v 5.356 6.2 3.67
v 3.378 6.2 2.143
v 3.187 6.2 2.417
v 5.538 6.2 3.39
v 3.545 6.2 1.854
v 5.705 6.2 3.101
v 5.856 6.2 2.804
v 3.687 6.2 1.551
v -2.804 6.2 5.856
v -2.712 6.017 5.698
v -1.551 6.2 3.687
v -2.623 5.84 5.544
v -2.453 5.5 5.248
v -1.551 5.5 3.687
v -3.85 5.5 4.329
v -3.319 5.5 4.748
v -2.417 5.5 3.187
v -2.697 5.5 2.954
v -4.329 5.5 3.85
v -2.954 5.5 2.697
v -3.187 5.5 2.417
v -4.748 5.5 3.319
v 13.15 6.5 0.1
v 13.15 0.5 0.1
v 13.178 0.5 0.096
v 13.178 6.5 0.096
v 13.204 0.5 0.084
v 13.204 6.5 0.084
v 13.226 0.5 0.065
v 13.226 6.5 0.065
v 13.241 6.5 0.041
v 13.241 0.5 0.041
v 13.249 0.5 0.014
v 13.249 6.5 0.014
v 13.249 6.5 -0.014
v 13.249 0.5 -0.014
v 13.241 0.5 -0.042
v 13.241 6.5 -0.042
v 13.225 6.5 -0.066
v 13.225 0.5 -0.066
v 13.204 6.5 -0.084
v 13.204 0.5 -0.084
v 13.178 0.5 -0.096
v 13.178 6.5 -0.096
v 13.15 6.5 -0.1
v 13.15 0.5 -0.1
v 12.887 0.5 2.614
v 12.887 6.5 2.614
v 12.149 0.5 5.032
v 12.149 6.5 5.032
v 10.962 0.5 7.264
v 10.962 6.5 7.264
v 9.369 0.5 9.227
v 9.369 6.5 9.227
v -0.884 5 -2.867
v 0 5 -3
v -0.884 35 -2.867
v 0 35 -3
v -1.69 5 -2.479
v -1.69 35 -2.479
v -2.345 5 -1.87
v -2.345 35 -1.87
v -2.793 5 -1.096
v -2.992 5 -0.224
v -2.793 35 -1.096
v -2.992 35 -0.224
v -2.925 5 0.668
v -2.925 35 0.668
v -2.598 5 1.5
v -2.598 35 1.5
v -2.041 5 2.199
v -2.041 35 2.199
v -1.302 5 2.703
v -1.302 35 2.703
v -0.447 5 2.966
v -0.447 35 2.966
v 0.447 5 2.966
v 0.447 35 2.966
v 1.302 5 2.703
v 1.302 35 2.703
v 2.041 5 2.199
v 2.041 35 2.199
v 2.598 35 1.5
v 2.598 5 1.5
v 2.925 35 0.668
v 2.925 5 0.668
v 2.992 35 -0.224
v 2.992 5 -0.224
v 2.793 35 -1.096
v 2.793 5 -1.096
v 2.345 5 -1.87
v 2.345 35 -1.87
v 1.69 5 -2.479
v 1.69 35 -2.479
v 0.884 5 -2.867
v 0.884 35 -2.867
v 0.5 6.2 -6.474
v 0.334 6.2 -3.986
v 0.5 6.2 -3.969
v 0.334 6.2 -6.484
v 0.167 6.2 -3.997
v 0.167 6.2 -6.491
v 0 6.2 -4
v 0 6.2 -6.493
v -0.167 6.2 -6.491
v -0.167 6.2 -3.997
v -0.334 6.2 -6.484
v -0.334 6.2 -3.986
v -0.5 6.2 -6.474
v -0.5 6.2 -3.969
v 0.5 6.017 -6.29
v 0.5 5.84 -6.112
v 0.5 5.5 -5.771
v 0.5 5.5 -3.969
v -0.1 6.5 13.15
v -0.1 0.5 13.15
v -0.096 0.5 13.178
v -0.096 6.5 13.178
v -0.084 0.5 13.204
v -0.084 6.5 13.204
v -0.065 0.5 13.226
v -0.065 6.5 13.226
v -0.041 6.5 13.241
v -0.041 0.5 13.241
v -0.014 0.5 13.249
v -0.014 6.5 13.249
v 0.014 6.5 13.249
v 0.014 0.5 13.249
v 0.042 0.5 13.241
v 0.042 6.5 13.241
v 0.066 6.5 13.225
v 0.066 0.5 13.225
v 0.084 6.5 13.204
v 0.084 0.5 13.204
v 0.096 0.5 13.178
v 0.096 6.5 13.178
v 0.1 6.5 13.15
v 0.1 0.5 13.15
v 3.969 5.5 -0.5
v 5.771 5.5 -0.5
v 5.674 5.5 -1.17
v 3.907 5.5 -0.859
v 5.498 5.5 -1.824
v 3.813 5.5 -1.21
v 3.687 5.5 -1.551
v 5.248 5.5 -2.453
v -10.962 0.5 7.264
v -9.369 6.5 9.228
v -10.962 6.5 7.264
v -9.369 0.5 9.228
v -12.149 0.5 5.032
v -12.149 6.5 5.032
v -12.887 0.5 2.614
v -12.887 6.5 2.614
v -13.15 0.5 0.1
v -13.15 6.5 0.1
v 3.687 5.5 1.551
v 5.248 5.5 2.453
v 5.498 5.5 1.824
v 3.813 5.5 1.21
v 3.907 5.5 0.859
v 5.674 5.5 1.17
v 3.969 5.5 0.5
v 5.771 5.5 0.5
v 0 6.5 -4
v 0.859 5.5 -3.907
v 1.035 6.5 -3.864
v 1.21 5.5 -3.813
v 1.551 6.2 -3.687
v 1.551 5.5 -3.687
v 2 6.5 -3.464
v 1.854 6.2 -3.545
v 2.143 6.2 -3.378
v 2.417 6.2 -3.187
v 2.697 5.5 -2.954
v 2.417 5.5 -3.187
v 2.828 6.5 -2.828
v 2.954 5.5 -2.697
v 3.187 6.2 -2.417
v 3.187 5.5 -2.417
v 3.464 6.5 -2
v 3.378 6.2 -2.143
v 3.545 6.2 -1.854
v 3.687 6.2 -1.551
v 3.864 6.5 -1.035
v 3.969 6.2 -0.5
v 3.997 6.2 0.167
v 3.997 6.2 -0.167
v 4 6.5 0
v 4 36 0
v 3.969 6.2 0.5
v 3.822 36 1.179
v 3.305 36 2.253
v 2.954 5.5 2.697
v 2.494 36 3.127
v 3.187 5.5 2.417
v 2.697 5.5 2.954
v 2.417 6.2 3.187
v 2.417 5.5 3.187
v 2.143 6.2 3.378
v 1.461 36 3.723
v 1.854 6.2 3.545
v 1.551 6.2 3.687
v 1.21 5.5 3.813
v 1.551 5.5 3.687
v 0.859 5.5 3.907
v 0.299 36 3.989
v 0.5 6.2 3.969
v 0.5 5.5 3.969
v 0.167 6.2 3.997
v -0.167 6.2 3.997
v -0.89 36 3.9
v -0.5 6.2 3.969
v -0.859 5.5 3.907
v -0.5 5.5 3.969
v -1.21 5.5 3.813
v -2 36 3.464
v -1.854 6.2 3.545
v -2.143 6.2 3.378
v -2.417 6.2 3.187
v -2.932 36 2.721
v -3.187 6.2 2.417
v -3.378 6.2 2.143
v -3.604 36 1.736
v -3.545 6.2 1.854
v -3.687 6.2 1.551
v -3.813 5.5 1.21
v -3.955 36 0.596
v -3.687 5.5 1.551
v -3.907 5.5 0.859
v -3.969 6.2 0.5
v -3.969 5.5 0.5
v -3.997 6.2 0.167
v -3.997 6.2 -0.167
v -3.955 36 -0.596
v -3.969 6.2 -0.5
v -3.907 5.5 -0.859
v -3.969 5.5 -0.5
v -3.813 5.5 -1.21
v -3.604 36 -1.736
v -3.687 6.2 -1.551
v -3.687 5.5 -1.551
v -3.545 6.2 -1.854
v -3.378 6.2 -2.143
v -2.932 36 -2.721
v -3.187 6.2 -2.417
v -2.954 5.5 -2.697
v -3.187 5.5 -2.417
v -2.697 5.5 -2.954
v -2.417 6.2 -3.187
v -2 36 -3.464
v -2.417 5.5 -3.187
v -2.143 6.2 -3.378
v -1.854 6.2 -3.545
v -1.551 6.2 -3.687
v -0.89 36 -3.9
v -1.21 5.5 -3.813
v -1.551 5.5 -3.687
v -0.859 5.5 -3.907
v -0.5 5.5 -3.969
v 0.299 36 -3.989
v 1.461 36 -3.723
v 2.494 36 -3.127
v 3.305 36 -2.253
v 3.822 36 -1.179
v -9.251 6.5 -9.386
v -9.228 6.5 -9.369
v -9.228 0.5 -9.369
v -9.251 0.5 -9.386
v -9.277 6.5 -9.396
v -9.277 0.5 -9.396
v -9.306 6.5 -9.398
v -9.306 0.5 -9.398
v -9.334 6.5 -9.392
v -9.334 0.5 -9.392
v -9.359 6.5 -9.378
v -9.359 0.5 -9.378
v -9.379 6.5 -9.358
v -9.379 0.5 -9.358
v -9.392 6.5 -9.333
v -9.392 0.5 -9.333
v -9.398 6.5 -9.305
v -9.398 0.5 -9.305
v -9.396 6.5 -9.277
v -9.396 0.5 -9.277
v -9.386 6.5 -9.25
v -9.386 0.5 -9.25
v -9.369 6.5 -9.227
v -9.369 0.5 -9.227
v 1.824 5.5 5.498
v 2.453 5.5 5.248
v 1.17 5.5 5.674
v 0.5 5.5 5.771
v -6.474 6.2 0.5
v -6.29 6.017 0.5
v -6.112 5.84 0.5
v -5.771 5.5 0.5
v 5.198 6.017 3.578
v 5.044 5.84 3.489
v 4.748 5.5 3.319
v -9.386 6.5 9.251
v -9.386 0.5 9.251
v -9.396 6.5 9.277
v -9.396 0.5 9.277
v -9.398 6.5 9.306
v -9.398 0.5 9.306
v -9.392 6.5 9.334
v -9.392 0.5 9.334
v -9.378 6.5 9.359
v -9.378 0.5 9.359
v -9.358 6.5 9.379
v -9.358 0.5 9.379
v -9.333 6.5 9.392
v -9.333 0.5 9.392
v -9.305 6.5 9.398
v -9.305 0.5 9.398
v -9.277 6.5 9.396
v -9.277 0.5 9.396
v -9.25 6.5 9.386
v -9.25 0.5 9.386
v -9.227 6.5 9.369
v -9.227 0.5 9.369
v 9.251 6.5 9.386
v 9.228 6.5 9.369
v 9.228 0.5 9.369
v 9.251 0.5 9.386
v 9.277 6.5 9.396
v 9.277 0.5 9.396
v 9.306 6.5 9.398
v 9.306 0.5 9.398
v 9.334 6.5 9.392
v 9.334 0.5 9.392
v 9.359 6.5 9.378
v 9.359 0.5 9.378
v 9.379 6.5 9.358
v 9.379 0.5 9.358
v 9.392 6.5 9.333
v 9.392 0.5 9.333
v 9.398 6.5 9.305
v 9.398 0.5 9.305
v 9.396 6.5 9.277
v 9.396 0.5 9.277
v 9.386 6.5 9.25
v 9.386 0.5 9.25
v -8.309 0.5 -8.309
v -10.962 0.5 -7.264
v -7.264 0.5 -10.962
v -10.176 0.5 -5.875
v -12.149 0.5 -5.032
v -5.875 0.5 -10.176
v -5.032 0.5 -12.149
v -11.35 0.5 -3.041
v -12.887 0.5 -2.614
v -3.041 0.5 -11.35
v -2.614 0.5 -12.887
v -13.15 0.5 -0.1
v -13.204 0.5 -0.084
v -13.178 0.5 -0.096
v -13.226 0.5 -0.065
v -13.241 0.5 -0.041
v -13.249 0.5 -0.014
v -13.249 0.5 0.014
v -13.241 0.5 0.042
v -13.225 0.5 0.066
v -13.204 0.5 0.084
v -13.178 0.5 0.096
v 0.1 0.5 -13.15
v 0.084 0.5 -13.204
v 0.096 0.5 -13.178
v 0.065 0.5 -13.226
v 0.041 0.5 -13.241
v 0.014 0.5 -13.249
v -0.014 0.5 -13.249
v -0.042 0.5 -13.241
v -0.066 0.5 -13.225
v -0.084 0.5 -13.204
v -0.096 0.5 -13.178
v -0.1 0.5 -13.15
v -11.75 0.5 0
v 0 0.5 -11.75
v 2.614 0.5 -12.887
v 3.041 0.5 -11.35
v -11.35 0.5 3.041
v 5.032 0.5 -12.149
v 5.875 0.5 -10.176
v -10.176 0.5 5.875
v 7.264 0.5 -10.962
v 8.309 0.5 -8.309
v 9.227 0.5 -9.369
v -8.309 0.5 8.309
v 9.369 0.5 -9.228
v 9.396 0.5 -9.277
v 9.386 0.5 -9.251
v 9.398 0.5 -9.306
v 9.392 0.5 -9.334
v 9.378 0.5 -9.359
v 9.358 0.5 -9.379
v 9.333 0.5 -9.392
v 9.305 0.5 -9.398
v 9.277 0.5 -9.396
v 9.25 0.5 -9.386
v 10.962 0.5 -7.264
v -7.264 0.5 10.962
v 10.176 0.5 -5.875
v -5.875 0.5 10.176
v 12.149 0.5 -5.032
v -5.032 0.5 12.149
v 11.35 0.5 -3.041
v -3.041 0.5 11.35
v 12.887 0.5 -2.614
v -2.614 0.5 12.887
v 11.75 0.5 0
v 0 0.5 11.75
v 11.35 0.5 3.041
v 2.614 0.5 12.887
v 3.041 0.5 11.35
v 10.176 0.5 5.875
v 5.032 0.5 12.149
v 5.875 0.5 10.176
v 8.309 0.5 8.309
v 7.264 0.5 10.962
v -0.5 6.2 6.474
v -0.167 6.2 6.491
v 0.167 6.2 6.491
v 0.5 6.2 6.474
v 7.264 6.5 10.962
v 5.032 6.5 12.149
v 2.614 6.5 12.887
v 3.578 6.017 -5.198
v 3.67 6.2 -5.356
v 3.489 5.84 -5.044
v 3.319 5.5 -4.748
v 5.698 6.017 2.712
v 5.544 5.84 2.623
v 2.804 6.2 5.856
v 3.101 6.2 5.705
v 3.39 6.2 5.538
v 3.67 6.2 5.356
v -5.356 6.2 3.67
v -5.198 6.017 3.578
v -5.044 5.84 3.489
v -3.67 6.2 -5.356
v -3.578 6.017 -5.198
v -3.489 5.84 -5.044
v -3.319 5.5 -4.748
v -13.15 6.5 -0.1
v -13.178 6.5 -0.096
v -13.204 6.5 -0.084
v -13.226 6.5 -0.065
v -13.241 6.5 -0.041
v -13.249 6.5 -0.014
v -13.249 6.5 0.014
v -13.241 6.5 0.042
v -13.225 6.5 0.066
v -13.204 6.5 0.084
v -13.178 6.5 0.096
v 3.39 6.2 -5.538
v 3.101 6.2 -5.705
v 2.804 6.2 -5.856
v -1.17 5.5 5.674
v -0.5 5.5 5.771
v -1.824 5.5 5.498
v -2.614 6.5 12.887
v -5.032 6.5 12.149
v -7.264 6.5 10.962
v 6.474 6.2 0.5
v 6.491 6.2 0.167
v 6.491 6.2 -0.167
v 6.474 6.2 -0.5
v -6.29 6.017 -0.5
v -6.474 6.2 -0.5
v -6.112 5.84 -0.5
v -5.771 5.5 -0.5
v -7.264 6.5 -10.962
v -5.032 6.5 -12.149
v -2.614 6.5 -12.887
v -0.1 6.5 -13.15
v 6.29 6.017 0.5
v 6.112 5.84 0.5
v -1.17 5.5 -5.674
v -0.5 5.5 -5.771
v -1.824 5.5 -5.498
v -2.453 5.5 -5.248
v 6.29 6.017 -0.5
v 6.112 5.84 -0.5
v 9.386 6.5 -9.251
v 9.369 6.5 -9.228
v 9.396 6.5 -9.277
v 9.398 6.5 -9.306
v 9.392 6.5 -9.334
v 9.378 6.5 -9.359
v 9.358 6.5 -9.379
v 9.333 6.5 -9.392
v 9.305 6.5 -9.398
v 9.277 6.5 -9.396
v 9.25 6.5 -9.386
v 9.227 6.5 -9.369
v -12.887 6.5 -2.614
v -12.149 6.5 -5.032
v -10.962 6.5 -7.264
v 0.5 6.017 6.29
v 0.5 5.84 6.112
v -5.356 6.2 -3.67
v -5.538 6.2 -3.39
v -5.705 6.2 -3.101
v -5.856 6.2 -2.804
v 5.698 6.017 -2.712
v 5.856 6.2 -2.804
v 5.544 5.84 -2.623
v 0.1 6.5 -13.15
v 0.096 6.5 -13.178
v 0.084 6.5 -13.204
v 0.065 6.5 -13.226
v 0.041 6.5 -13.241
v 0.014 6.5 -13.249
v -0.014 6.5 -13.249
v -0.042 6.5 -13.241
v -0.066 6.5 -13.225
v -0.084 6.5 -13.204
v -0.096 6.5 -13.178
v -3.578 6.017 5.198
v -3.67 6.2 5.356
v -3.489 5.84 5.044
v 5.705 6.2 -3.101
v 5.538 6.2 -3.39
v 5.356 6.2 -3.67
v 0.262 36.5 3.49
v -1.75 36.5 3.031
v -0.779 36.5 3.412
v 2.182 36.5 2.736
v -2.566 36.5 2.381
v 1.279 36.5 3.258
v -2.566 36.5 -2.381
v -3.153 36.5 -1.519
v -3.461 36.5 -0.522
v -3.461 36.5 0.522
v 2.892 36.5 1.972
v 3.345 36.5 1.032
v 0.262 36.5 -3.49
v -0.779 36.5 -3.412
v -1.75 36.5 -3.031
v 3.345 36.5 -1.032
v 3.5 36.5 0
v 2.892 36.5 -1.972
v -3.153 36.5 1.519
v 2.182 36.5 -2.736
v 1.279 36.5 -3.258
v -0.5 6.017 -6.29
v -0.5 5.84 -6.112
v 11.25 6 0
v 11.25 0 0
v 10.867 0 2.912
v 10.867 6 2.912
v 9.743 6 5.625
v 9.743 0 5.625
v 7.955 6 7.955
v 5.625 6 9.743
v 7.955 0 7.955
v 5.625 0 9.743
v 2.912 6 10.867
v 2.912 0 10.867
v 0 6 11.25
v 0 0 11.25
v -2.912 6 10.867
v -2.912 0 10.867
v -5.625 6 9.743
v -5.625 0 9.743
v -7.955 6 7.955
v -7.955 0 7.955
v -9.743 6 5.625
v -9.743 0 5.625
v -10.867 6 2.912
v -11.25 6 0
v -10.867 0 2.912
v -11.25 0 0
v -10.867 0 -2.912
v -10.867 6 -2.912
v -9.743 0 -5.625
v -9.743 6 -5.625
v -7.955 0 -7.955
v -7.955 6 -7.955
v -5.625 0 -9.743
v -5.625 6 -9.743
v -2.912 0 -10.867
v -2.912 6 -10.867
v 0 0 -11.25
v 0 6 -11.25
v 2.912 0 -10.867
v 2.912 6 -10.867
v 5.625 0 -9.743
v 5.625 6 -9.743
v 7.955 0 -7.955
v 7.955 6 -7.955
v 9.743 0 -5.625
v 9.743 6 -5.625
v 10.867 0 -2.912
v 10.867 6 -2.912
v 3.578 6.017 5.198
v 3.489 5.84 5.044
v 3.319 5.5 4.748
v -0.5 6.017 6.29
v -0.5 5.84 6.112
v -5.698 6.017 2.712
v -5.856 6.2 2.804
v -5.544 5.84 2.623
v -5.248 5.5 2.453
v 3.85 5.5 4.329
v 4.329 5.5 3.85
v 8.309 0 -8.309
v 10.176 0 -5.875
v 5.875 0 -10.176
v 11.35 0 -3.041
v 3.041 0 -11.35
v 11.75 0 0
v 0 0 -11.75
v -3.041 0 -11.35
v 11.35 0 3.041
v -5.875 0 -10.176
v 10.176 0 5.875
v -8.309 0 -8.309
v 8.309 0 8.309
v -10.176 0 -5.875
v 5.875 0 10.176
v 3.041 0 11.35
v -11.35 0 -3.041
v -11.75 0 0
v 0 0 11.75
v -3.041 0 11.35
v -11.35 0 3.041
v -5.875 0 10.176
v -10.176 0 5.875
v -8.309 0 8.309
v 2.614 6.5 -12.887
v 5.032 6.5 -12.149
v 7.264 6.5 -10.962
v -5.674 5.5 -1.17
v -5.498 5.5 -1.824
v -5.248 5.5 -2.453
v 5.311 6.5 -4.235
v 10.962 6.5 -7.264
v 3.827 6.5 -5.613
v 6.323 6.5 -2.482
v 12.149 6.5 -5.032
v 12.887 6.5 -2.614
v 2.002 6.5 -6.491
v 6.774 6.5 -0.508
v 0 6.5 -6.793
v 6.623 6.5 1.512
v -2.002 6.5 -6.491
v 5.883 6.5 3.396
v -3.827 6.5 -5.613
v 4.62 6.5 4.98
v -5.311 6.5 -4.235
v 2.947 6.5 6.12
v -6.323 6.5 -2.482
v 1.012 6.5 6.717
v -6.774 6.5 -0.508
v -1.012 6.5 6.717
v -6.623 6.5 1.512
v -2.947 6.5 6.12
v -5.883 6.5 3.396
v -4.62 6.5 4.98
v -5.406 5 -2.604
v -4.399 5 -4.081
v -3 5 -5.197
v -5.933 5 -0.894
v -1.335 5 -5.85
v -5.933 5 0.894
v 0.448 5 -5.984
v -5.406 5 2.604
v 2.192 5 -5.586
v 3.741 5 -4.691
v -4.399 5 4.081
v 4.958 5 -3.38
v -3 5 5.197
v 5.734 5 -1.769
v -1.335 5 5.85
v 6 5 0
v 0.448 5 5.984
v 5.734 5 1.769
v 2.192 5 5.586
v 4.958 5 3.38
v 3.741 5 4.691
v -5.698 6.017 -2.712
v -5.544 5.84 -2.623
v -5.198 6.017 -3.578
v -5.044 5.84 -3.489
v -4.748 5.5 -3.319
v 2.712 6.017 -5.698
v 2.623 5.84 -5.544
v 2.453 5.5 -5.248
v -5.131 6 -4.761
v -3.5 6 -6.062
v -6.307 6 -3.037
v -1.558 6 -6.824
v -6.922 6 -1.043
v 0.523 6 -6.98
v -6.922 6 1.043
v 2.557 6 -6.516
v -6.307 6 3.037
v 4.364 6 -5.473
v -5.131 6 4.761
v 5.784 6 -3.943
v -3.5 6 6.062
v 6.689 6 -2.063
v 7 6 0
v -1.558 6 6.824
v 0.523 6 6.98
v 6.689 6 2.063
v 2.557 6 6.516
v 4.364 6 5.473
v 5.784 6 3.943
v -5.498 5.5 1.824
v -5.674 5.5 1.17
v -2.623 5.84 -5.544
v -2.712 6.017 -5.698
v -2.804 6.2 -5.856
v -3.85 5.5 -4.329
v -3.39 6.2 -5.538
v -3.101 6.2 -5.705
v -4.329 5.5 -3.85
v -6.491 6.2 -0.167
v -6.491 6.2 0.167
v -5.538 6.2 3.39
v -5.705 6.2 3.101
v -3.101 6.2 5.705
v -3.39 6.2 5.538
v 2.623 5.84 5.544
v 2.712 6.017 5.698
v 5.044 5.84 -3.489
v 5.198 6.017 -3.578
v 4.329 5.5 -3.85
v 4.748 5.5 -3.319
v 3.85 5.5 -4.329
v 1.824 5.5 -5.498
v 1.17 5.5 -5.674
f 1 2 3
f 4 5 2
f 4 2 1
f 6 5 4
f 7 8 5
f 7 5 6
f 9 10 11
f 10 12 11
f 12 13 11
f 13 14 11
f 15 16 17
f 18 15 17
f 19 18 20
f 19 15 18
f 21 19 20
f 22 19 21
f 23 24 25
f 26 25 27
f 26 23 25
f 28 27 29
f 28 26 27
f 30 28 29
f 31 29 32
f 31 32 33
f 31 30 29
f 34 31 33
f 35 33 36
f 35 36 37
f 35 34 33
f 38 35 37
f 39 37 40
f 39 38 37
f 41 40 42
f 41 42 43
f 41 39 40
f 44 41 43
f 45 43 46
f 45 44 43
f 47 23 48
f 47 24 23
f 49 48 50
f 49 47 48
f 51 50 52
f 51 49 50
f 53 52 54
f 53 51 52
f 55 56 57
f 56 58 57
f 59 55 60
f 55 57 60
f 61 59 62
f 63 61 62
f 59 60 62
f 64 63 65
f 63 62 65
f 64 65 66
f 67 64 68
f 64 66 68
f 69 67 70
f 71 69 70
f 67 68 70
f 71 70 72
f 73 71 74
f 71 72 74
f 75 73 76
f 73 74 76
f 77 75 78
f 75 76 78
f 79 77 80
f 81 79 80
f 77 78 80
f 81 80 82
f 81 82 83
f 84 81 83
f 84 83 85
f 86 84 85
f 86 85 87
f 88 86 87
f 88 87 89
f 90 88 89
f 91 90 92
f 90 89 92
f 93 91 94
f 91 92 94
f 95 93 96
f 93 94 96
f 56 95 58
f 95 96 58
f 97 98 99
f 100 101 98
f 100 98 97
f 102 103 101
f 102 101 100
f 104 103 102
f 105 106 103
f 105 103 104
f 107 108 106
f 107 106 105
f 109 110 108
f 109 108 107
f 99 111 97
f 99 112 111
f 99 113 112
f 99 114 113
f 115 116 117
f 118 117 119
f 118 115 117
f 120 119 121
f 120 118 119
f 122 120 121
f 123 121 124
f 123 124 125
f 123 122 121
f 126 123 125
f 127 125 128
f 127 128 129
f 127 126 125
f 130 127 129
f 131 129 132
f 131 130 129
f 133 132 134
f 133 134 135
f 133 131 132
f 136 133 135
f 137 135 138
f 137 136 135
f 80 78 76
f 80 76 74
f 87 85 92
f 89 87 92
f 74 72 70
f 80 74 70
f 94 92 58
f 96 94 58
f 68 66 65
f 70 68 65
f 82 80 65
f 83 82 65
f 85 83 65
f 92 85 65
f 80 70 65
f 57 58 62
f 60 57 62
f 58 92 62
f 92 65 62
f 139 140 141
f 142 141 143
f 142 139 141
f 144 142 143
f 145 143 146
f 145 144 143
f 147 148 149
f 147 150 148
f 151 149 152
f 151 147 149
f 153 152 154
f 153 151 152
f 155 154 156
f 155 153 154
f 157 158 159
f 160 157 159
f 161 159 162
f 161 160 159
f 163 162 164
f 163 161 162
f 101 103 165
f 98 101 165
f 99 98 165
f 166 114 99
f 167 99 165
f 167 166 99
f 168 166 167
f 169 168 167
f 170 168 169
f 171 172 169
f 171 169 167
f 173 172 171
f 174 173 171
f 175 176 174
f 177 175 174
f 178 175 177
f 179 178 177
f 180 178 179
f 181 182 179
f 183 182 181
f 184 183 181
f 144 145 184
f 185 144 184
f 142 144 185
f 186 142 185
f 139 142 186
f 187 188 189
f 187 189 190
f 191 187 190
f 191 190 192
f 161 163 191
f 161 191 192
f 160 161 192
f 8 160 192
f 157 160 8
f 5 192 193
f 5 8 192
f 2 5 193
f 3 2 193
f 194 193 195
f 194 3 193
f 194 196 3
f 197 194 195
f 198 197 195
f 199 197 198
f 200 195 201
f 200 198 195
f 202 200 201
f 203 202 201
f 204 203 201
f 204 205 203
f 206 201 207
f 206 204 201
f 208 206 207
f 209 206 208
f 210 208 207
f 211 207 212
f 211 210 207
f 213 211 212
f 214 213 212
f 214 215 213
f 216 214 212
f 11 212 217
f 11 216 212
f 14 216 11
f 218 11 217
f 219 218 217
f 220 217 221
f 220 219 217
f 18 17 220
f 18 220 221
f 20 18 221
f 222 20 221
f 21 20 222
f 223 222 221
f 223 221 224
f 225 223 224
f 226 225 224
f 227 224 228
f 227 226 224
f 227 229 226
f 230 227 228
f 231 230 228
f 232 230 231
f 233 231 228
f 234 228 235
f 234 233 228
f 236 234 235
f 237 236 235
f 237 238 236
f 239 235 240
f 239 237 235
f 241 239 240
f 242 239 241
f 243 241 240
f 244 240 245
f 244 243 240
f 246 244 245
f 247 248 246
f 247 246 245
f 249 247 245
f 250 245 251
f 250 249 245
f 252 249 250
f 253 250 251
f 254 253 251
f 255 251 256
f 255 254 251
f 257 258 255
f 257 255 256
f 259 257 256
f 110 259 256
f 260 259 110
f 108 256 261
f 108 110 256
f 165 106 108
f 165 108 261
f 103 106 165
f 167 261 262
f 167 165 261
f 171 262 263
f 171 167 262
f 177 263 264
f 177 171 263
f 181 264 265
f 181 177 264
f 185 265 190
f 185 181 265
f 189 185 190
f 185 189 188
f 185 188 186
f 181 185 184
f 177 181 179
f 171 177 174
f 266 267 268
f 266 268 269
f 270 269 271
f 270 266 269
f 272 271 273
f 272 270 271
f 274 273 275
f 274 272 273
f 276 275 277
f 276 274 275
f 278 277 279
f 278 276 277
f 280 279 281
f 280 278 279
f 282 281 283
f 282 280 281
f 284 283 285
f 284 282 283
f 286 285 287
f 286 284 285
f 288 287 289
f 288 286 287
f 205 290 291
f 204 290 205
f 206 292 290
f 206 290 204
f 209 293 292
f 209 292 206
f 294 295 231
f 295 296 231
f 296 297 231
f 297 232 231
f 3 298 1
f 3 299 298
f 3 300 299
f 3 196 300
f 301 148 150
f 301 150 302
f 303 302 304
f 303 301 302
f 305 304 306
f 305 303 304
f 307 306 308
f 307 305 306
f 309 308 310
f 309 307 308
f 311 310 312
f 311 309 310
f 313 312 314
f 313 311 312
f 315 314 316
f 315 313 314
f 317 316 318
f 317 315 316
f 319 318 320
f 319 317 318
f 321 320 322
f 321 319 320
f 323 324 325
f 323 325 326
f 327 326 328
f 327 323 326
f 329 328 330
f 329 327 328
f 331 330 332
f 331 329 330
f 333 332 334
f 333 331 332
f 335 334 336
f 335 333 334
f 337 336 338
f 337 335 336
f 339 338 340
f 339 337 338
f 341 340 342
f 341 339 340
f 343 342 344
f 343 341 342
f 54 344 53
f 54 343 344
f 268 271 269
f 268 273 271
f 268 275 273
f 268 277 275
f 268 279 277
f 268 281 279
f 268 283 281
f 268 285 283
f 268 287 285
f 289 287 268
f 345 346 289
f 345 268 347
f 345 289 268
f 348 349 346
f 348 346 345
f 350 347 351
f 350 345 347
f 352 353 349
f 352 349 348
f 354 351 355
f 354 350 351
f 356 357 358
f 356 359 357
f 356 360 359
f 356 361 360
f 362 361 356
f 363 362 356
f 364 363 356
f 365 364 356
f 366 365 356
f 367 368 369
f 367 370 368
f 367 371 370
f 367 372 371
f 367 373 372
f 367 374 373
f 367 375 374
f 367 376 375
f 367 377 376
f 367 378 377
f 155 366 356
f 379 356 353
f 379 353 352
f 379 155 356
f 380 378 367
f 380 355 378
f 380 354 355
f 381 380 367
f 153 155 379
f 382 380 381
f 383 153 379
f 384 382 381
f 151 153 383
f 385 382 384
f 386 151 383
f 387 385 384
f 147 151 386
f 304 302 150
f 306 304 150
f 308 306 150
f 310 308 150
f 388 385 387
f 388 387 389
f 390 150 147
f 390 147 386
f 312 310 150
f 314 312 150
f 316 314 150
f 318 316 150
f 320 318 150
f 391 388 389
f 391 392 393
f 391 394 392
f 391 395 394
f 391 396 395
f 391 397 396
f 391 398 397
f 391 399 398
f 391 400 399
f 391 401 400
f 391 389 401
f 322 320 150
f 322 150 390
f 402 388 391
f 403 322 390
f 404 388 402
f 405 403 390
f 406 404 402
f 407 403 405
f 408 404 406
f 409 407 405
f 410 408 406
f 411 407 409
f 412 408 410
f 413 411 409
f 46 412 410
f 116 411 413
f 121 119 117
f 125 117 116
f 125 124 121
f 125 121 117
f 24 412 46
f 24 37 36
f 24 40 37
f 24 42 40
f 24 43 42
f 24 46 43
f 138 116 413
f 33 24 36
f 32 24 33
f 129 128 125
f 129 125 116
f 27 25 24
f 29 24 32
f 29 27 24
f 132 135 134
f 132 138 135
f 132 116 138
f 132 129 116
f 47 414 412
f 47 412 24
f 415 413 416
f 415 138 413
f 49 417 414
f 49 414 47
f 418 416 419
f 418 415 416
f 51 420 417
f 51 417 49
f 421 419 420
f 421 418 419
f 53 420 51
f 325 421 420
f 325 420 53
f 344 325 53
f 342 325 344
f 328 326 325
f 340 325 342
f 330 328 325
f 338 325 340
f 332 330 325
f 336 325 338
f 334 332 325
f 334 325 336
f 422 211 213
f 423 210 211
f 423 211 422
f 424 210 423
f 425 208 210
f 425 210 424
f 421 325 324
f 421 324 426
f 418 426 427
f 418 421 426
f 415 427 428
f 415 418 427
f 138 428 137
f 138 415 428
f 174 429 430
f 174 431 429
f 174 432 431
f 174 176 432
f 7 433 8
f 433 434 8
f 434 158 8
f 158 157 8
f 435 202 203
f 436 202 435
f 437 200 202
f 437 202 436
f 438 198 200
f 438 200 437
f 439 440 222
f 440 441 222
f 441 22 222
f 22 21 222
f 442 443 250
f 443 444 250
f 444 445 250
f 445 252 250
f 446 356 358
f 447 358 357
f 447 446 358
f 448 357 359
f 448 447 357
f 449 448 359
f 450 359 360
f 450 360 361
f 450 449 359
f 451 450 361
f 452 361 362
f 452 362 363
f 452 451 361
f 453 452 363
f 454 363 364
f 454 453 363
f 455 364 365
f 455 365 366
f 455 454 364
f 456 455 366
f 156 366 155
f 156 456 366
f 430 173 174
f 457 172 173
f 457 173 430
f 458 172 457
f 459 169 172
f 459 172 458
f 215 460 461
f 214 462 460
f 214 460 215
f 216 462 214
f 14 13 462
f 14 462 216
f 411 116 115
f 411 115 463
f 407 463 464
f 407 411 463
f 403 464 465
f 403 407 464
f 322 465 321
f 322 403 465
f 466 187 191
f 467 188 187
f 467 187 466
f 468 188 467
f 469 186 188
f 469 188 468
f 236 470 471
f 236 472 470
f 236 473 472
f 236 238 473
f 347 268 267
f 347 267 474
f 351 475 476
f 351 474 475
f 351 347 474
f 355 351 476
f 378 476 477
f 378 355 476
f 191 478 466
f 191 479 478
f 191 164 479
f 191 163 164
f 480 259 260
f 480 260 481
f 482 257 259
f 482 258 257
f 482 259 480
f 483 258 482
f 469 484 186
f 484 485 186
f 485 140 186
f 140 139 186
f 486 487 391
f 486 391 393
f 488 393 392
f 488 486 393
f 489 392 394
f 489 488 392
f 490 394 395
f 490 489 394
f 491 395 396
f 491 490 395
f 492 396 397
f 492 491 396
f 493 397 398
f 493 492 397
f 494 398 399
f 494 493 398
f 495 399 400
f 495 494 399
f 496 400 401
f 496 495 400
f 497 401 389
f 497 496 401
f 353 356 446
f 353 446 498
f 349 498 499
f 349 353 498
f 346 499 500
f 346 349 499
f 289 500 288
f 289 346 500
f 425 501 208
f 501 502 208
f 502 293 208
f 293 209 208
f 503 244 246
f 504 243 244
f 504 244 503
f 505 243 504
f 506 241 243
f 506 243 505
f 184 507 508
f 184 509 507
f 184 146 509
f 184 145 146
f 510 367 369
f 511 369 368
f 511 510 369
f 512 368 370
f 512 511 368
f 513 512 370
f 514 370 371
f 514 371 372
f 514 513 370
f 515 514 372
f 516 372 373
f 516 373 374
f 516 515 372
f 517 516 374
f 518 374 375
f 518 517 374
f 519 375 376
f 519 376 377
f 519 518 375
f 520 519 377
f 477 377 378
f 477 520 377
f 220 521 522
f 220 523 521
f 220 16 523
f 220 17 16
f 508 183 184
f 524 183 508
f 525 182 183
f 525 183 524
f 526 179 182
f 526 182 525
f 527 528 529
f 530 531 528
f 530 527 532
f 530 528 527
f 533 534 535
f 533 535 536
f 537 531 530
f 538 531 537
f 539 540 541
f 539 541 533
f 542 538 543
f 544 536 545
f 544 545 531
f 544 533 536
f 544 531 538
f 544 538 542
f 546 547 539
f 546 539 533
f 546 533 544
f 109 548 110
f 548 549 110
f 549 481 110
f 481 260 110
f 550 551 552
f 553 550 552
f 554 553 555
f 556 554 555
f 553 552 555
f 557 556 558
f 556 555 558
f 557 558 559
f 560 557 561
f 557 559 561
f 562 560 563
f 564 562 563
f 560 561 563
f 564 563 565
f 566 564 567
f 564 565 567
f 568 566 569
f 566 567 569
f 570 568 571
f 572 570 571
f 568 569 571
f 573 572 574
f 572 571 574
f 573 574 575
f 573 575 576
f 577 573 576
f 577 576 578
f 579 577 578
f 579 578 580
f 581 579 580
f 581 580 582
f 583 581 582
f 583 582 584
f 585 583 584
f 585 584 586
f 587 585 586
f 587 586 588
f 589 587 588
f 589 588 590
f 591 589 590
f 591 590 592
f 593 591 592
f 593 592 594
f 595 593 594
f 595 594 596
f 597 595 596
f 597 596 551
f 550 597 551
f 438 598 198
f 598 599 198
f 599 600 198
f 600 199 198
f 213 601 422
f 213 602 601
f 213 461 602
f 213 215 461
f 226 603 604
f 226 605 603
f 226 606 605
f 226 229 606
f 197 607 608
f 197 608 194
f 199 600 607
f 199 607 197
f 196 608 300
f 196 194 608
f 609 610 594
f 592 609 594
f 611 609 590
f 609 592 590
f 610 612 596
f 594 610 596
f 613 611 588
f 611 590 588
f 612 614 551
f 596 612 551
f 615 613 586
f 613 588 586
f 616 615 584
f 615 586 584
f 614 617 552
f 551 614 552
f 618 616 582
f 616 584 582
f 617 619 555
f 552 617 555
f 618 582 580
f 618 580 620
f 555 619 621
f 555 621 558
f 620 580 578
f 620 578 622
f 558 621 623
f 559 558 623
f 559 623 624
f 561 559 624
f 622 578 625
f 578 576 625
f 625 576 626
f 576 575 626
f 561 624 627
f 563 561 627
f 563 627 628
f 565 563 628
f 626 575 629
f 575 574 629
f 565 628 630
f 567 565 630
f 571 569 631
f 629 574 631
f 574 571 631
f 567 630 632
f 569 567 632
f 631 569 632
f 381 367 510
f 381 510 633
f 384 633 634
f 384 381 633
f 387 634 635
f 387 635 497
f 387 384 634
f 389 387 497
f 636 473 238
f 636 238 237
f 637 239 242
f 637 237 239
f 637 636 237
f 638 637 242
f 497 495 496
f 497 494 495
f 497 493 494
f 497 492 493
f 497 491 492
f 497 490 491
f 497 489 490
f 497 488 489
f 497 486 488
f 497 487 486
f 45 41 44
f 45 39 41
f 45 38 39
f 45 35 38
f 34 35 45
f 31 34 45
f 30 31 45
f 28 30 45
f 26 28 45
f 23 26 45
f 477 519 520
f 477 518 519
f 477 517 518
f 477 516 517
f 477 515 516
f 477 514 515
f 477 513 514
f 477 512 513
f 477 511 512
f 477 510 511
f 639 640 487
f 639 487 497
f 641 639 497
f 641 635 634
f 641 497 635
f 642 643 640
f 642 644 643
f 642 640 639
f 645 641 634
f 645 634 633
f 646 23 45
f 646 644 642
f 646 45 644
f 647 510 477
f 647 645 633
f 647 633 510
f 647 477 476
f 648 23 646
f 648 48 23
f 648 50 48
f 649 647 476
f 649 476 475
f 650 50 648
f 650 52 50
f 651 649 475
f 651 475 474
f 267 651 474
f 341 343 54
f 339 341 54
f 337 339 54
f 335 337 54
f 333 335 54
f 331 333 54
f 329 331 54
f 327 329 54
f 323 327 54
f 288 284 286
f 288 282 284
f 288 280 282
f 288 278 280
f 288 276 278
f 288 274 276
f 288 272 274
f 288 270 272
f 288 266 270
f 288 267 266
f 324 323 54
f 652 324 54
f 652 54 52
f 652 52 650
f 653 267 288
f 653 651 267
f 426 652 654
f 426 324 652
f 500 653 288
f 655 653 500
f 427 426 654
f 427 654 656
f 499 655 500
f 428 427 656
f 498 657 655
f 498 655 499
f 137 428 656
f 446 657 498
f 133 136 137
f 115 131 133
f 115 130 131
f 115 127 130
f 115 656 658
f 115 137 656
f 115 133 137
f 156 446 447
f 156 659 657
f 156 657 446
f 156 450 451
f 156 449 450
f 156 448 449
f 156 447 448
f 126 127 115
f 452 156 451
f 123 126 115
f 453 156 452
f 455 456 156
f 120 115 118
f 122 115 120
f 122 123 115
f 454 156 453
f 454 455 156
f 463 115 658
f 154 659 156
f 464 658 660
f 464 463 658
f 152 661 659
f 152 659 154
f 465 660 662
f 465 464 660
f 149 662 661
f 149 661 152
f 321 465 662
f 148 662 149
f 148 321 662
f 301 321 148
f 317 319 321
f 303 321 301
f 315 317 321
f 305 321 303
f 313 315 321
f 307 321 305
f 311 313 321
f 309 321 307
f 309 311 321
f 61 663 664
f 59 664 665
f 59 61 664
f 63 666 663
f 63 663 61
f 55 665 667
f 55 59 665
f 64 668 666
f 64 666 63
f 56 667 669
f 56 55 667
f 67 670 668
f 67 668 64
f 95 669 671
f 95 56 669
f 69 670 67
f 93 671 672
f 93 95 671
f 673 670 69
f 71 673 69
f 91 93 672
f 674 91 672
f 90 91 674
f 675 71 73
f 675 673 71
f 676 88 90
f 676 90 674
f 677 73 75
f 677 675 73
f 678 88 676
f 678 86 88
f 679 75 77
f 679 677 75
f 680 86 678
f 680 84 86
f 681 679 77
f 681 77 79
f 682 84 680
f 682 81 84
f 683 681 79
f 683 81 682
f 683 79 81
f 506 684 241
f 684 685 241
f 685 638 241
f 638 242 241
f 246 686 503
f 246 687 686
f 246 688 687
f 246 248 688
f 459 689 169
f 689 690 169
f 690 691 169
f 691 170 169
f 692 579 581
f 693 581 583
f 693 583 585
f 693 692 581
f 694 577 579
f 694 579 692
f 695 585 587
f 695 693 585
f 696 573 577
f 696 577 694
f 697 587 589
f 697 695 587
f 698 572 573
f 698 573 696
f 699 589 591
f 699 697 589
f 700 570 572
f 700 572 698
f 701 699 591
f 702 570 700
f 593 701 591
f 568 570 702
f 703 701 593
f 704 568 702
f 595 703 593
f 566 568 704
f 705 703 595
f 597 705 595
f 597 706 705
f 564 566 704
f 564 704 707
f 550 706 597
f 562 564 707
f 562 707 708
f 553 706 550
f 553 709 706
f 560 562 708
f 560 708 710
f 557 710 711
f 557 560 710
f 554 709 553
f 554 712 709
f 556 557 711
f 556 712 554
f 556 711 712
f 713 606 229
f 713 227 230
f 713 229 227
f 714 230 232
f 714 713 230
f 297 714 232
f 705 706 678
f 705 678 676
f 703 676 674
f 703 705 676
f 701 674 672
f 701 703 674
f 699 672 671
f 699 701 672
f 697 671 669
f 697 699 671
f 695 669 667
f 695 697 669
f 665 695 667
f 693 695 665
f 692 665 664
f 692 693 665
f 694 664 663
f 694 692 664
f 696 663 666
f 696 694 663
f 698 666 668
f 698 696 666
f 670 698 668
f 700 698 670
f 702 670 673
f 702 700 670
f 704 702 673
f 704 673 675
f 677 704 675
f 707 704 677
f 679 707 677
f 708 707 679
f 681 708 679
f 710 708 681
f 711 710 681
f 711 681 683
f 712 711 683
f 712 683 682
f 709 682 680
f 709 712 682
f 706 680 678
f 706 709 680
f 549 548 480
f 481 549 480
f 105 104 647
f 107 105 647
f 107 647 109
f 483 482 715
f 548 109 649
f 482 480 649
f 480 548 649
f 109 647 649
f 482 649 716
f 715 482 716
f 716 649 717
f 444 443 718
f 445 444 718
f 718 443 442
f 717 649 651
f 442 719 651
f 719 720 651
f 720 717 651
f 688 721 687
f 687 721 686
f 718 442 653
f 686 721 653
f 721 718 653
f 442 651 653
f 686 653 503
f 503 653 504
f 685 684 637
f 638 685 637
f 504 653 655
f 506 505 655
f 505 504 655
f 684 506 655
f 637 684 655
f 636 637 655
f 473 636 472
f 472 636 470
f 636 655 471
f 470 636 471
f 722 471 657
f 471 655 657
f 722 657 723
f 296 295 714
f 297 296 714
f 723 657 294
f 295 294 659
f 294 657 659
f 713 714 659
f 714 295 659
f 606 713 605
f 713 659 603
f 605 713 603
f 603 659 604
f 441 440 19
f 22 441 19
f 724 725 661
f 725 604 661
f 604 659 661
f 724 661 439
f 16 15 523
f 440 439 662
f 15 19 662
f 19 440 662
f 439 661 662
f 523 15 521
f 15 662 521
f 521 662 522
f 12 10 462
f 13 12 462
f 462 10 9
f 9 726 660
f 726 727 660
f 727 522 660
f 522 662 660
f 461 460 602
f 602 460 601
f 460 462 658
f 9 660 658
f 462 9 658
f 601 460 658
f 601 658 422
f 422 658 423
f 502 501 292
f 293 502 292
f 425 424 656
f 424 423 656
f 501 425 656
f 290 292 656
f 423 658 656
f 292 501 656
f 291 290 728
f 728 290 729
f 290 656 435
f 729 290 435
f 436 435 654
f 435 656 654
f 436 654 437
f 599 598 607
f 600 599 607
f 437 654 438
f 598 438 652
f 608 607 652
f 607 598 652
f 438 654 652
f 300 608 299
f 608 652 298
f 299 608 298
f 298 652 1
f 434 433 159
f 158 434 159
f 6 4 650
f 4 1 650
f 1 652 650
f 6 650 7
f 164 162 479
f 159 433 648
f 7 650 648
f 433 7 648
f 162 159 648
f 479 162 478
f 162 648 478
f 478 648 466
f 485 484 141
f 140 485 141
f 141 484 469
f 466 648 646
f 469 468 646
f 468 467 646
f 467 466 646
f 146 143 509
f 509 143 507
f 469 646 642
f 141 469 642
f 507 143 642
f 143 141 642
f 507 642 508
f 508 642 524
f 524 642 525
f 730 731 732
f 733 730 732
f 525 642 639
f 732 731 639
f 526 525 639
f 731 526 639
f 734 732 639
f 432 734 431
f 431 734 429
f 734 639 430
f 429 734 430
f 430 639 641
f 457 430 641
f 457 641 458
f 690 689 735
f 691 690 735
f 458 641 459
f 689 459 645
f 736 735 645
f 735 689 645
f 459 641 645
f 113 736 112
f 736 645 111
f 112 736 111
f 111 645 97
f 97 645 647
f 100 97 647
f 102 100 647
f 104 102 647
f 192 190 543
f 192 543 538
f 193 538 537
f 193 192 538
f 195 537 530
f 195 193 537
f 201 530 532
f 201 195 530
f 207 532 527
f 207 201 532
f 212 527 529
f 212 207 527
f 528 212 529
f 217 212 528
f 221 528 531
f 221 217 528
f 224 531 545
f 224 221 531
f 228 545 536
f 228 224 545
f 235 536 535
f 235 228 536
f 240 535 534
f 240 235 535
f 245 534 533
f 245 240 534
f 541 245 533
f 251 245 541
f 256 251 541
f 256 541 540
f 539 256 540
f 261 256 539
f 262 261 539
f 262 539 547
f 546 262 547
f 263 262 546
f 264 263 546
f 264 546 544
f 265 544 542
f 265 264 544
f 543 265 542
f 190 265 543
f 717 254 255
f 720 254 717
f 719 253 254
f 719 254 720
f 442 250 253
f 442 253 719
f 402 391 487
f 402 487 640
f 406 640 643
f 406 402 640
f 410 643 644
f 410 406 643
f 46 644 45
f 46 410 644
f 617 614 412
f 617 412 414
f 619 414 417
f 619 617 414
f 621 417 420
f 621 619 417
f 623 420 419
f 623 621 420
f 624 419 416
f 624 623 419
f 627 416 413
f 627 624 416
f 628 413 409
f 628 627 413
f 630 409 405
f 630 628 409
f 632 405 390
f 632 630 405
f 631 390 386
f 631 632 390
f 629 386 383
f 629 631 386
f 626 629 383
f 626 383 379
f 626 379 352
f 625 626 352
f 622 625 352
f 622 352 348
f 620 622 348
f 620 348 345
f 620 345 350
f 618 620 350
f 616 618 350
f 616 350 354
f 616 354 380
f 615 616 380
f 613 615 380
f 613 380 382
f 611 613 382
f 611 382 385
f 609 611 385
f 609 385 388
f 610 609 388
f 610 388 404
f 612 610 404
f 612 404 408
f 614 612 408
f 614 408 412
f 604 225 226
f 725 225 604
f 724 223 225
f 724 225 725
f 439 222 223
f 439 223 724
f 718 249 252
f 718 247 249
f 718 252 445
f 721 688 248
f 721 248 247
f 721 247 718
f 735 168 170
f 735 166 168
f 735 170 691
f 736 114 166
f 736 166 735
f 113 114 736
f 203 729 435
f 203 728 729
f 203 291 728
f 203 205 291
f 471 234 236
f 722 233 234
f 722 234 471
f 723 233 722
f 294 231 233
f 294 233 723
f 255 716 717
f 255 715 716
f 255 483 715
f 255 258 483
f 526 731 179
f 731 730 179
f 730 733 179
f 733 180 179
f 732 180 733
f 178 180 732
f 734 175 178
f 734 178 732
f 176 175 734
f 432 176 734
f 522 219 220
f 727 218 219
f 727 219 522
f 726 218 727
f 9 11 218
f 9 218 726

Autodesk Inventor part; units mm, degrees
ref_plane "YZ Plane" through (0, 0, 0) normal (1, 0, 0) x (0, 1, 0)
ref_plane "XZ Plane" through (0, 0, 0) normal (0, 1, 0) x (-1, 0, 0)
ref_plane "XY Plane" through (0, 0, 0) normal (0, 0, 1) x (1, 0, 0)
sketch "Sketch1" plane through (0, 0, 0) normal (0, 1, 0) x (-1, 0, 0)
  circle A0 centre (0, 0) radius 13.15
  dimension "d0" = 26.3
extrude "Extrusion1" add sketch "Sketch1" along normal blind 6.5
sketch "Sketch2" plane through (0, 0, 0) normal (0, -1, 0) x (1, 0, 0)
  circle A0 centre (0, 0) radius 13.15 projected
  circle A1 centre (0, 0) radius 11.75
  dimension "d3" = 23.5
extrude "Extrusion2" cut sketch "Sketch2" against normal blind 0.5
sketch "Sketch3" plane through (0, 0, 0) normal (0, -1, 0) x (1, 0, 0)
  circle A0 centre (0, 0) radius 11.25
  dimension "d6" = 22.5
extrude "Extrusion3" cut sketch "Sketch3" against normal blind 6
sketch "Sketch4" plane through (0, 6.5, 0) normal (0, 1, 0) x (1, 0, 0)
  circle A0 centre (0, 0) radius 4
  dimension "d9" = 8
extrude "Extrusion4" add sketch "Sketch4" along normal blind 30
chamfer "Chamfer1" distance 0.5 angle 45 1 edges at (-4, 36.5, 0)
sketch "Sketch5" plane through (0, 6, 0) normal (0, -1, 0) x (1, 0, 0)
  circle A0 centre (0, 0) radius 7
  dimension "d15" = 14
extrude "Extrusion5" add sketch "Sketch5" along normal blind 1
chamfer "Chamfer2" distance 1 angle 45 1 edges at (-7, 5, 0)
sketch "Sketch6" plane through (0, 5, 0) normal (0, -1, 0) x (1, 0, 0)
  point P0 (0, 0)
hole "Hole1" at (0, 5, 0) direction (0, 1, 0) diameter 6 depth 30
sketch "Sketch7" plane through (0, 0, 0) normal (1, 0, 0) x (0, 1, 0)
  line L0 (6.5, 4) -> (6.5, -4) projected
  line L1 (6.5, -4) -> (5.5, -4)
  line L2 (5.5, -4) -> (5.5, -5.7929)
  line L3 (5.5, -5.7929) -> (6.5, -6.7929)
  line L4 (6.5, -13.15) -> (6.5, 13.15) projected
  line L5 (0.5, -11.75) -> (0, -11.75) projected
  line L6 (0, -11.75) -> (0, -11.25) projected
  line L7 (0, -11.25) -> (6, -11.25) projected
  line L8 (6, -11.25) -> (6, -7) projected
  line L9 (6, -7) -> (5, -6) projected
  line L10 (5, -6) -> (5, -3) projected
  line L11 (5, -3) -> (35, -3) projected
  line L12 (35, -3) -> (35, 3) projected
  line L13 (35, 3) -> (5, 3) projected
  line L14 (5, 3) -> (5, 6) projected
  line L15 (5, 6) -> (6, 7) projected
  line L16 (6, 7) -> (6, 11.25) projected
  line L17 (6, 11.25) -> (0, 11.25) projected
  line L18 (0, 11.25) -> (0, 11.75) projected
  line L19 (0, 11.75) -> (0.5, 11.75) projected
  line L20 (0.5, 11.75) -> (0.5, 13.15) projected
  line L21 (0.5, 13.15) -> (6.5, 13.15) projected
  line L22 (6.5, 13.15) -> (6.5, 4) projected
  line L23 (6.5, 4) -> (36, 4) projected
  line L24 (36, 4) -> (36.5, 3.5) projected
  line L25 (36.5, 3.5) -> (36.5, -3.5) projected
  line L26 (36.5, -3.5) -> (36, -4) projected
  line L27 (36, -4) -> (6.5, -4) projected
  line L28 (6.5, -4) -> (6.5, -13.15) projected
  line L29 (6.5, -13.15) -> (0.5, -13.15) projected
  line L30 (0.5, -13.15) -> (0.5, -11.75) projected
  line L31 (0, 0) -> (40, 0)
  dimension "d28" = 0.5
  dimension "d29" = 0.5
  dimension "d30" = 0.5
revolve "Revolution1" cut sketch "Sketch7" angle 360 about axis through (0, 0, 0) along (0, 1, 0) contours L4 L3 L2 L1
sketch "Sketch8" plane through (0, 0, 0) normal (1, 0, 0) x (0, 1, 0)
  line L0 (0.5, -11.75) -> (0, -11.75) projected
  line L1 (0, -11.75) -> (0, -11.25) projected
  line L2 (0, -11.25) -> (6, -11.25) projected
  line L3 (6, -11.25) -> (6, -7) projected
  line L4 (6, -7) -> (5, -6) projected
  line L5 (5, -6) -> (5, -3) projected
  line L6 (5, -3) -> (35, -3) projected
  line L7 (35, -3) -> (35, 3) projected
  line L8 (35, 3) -> (5, 3) projected
  line L9 (5, 3) -> (5, 6) projected
  line L10 (5, 6) -> (6, 7) projected
  line L11 (6, 7) -> (6, 11.25) projected
  line L12 (6, 11.25) -> (0, 11.25) projected
  line L13 (0, 11.25) -> (0, 11.75) projected
  line L14 (0, 11.75) -> (0.5, 11.75) projected
  line L15 (0.5, 11.75) -> (0.5, 13.15) projected
  line L16 (0.5, 13.15) -> (6.5, 13.15) projected
  line L17 (6.5, 13.15) -> (6.5, 6.7929) projected
  line L18 (6.5, 6.7929) -> (5.5, 5.7929) projected
  line L19 (5.5, 5.7929) -> (5.5, 4) projected
  line L20 (5.5, 4) -> (36, 4) projected
  line L21 (36, 4) -> (36.5, 3.5) projected
  line L22 (36.5, 3.5) -> (36.5, -3.5) projected
  line L23 (36.5, -3.5) -> (36, -4) projected
  line L24 (36, -4) -> (5.5, -4) projected
  line L25 (5.5, -4) -> (5.5, -5.7929) projected
  line L26 (5.5, -5.7929) -> (6.5, -6.7929) projected
  line L27 (6.5, -6.7929) -> (6.5, -13.15) projected
  line L28 (6.5, -13.15) -> (0.5, -13.15) projected
  line L29 (0.5, -13.15) -> (0.5, -11.75) projected
  line L30 (5.5, -3.5) -> (6.2, -3.5)
  line L31 (6.2, -3.5) -> (6.2, -6.4929)
  line L32 (6.2, -6.4929) -> (5.5, -6.4929)
  line L33 (5.5, -6.4929) -> (5.5, -3.5)
  line L34 (6.5, 6.7929) -> (6.5, -6.7929) projected
  point P0 (0, 0)
  point P1 (5.5, -4)
  dimension "d32" = 0.3
extrude "Extrusion6" add sketch "Sketch8" along normal mid plane 1 contours L26 L25 L24 L31 | L24 L33 L30 L31
pattern_circular "Circular Pattern1" count 12 over 360 about axis through (0, 6.5, 0) along (0, 1, 0) of "Extrusion6"
sketch "Sketch9" plane through (0, 6.5, 0) normal (0, 1, 0) x (1, 0, 0)
  line L0 (0, 0) -> (0, 13.8998)
  circle A0 centre (0, 0) radius 13.25
  circle A1 centre (0, 0) radius 6.7929 projected
  circle A2 centre (0, 0) radius 4 projected
  circle A3 centre (0, 0) radius 3 projected
  circle A4 centre (0, 0) radius 13.15 projected
  circle A5 centre (0, 13.15) radius 0.1
  dimension "d38" = 26.5
extrude "Extrusion7" add sketch "Sketch9" against normal up to surface (6 mm away) contours A5 A4 L0 | L0 A4 A5 | A4 A5 L0 | L0 A5 A4
pattern_circular "Circular Pattern2" count 8 over 360 about axis through (0, 6.5, 0) along (0, 1, 0) of "Extrusion7"
equation "\"d29\" = d28"
equation "\"d30\" = d28"
properties part number "Piston" material "Acetal Resin, White"
